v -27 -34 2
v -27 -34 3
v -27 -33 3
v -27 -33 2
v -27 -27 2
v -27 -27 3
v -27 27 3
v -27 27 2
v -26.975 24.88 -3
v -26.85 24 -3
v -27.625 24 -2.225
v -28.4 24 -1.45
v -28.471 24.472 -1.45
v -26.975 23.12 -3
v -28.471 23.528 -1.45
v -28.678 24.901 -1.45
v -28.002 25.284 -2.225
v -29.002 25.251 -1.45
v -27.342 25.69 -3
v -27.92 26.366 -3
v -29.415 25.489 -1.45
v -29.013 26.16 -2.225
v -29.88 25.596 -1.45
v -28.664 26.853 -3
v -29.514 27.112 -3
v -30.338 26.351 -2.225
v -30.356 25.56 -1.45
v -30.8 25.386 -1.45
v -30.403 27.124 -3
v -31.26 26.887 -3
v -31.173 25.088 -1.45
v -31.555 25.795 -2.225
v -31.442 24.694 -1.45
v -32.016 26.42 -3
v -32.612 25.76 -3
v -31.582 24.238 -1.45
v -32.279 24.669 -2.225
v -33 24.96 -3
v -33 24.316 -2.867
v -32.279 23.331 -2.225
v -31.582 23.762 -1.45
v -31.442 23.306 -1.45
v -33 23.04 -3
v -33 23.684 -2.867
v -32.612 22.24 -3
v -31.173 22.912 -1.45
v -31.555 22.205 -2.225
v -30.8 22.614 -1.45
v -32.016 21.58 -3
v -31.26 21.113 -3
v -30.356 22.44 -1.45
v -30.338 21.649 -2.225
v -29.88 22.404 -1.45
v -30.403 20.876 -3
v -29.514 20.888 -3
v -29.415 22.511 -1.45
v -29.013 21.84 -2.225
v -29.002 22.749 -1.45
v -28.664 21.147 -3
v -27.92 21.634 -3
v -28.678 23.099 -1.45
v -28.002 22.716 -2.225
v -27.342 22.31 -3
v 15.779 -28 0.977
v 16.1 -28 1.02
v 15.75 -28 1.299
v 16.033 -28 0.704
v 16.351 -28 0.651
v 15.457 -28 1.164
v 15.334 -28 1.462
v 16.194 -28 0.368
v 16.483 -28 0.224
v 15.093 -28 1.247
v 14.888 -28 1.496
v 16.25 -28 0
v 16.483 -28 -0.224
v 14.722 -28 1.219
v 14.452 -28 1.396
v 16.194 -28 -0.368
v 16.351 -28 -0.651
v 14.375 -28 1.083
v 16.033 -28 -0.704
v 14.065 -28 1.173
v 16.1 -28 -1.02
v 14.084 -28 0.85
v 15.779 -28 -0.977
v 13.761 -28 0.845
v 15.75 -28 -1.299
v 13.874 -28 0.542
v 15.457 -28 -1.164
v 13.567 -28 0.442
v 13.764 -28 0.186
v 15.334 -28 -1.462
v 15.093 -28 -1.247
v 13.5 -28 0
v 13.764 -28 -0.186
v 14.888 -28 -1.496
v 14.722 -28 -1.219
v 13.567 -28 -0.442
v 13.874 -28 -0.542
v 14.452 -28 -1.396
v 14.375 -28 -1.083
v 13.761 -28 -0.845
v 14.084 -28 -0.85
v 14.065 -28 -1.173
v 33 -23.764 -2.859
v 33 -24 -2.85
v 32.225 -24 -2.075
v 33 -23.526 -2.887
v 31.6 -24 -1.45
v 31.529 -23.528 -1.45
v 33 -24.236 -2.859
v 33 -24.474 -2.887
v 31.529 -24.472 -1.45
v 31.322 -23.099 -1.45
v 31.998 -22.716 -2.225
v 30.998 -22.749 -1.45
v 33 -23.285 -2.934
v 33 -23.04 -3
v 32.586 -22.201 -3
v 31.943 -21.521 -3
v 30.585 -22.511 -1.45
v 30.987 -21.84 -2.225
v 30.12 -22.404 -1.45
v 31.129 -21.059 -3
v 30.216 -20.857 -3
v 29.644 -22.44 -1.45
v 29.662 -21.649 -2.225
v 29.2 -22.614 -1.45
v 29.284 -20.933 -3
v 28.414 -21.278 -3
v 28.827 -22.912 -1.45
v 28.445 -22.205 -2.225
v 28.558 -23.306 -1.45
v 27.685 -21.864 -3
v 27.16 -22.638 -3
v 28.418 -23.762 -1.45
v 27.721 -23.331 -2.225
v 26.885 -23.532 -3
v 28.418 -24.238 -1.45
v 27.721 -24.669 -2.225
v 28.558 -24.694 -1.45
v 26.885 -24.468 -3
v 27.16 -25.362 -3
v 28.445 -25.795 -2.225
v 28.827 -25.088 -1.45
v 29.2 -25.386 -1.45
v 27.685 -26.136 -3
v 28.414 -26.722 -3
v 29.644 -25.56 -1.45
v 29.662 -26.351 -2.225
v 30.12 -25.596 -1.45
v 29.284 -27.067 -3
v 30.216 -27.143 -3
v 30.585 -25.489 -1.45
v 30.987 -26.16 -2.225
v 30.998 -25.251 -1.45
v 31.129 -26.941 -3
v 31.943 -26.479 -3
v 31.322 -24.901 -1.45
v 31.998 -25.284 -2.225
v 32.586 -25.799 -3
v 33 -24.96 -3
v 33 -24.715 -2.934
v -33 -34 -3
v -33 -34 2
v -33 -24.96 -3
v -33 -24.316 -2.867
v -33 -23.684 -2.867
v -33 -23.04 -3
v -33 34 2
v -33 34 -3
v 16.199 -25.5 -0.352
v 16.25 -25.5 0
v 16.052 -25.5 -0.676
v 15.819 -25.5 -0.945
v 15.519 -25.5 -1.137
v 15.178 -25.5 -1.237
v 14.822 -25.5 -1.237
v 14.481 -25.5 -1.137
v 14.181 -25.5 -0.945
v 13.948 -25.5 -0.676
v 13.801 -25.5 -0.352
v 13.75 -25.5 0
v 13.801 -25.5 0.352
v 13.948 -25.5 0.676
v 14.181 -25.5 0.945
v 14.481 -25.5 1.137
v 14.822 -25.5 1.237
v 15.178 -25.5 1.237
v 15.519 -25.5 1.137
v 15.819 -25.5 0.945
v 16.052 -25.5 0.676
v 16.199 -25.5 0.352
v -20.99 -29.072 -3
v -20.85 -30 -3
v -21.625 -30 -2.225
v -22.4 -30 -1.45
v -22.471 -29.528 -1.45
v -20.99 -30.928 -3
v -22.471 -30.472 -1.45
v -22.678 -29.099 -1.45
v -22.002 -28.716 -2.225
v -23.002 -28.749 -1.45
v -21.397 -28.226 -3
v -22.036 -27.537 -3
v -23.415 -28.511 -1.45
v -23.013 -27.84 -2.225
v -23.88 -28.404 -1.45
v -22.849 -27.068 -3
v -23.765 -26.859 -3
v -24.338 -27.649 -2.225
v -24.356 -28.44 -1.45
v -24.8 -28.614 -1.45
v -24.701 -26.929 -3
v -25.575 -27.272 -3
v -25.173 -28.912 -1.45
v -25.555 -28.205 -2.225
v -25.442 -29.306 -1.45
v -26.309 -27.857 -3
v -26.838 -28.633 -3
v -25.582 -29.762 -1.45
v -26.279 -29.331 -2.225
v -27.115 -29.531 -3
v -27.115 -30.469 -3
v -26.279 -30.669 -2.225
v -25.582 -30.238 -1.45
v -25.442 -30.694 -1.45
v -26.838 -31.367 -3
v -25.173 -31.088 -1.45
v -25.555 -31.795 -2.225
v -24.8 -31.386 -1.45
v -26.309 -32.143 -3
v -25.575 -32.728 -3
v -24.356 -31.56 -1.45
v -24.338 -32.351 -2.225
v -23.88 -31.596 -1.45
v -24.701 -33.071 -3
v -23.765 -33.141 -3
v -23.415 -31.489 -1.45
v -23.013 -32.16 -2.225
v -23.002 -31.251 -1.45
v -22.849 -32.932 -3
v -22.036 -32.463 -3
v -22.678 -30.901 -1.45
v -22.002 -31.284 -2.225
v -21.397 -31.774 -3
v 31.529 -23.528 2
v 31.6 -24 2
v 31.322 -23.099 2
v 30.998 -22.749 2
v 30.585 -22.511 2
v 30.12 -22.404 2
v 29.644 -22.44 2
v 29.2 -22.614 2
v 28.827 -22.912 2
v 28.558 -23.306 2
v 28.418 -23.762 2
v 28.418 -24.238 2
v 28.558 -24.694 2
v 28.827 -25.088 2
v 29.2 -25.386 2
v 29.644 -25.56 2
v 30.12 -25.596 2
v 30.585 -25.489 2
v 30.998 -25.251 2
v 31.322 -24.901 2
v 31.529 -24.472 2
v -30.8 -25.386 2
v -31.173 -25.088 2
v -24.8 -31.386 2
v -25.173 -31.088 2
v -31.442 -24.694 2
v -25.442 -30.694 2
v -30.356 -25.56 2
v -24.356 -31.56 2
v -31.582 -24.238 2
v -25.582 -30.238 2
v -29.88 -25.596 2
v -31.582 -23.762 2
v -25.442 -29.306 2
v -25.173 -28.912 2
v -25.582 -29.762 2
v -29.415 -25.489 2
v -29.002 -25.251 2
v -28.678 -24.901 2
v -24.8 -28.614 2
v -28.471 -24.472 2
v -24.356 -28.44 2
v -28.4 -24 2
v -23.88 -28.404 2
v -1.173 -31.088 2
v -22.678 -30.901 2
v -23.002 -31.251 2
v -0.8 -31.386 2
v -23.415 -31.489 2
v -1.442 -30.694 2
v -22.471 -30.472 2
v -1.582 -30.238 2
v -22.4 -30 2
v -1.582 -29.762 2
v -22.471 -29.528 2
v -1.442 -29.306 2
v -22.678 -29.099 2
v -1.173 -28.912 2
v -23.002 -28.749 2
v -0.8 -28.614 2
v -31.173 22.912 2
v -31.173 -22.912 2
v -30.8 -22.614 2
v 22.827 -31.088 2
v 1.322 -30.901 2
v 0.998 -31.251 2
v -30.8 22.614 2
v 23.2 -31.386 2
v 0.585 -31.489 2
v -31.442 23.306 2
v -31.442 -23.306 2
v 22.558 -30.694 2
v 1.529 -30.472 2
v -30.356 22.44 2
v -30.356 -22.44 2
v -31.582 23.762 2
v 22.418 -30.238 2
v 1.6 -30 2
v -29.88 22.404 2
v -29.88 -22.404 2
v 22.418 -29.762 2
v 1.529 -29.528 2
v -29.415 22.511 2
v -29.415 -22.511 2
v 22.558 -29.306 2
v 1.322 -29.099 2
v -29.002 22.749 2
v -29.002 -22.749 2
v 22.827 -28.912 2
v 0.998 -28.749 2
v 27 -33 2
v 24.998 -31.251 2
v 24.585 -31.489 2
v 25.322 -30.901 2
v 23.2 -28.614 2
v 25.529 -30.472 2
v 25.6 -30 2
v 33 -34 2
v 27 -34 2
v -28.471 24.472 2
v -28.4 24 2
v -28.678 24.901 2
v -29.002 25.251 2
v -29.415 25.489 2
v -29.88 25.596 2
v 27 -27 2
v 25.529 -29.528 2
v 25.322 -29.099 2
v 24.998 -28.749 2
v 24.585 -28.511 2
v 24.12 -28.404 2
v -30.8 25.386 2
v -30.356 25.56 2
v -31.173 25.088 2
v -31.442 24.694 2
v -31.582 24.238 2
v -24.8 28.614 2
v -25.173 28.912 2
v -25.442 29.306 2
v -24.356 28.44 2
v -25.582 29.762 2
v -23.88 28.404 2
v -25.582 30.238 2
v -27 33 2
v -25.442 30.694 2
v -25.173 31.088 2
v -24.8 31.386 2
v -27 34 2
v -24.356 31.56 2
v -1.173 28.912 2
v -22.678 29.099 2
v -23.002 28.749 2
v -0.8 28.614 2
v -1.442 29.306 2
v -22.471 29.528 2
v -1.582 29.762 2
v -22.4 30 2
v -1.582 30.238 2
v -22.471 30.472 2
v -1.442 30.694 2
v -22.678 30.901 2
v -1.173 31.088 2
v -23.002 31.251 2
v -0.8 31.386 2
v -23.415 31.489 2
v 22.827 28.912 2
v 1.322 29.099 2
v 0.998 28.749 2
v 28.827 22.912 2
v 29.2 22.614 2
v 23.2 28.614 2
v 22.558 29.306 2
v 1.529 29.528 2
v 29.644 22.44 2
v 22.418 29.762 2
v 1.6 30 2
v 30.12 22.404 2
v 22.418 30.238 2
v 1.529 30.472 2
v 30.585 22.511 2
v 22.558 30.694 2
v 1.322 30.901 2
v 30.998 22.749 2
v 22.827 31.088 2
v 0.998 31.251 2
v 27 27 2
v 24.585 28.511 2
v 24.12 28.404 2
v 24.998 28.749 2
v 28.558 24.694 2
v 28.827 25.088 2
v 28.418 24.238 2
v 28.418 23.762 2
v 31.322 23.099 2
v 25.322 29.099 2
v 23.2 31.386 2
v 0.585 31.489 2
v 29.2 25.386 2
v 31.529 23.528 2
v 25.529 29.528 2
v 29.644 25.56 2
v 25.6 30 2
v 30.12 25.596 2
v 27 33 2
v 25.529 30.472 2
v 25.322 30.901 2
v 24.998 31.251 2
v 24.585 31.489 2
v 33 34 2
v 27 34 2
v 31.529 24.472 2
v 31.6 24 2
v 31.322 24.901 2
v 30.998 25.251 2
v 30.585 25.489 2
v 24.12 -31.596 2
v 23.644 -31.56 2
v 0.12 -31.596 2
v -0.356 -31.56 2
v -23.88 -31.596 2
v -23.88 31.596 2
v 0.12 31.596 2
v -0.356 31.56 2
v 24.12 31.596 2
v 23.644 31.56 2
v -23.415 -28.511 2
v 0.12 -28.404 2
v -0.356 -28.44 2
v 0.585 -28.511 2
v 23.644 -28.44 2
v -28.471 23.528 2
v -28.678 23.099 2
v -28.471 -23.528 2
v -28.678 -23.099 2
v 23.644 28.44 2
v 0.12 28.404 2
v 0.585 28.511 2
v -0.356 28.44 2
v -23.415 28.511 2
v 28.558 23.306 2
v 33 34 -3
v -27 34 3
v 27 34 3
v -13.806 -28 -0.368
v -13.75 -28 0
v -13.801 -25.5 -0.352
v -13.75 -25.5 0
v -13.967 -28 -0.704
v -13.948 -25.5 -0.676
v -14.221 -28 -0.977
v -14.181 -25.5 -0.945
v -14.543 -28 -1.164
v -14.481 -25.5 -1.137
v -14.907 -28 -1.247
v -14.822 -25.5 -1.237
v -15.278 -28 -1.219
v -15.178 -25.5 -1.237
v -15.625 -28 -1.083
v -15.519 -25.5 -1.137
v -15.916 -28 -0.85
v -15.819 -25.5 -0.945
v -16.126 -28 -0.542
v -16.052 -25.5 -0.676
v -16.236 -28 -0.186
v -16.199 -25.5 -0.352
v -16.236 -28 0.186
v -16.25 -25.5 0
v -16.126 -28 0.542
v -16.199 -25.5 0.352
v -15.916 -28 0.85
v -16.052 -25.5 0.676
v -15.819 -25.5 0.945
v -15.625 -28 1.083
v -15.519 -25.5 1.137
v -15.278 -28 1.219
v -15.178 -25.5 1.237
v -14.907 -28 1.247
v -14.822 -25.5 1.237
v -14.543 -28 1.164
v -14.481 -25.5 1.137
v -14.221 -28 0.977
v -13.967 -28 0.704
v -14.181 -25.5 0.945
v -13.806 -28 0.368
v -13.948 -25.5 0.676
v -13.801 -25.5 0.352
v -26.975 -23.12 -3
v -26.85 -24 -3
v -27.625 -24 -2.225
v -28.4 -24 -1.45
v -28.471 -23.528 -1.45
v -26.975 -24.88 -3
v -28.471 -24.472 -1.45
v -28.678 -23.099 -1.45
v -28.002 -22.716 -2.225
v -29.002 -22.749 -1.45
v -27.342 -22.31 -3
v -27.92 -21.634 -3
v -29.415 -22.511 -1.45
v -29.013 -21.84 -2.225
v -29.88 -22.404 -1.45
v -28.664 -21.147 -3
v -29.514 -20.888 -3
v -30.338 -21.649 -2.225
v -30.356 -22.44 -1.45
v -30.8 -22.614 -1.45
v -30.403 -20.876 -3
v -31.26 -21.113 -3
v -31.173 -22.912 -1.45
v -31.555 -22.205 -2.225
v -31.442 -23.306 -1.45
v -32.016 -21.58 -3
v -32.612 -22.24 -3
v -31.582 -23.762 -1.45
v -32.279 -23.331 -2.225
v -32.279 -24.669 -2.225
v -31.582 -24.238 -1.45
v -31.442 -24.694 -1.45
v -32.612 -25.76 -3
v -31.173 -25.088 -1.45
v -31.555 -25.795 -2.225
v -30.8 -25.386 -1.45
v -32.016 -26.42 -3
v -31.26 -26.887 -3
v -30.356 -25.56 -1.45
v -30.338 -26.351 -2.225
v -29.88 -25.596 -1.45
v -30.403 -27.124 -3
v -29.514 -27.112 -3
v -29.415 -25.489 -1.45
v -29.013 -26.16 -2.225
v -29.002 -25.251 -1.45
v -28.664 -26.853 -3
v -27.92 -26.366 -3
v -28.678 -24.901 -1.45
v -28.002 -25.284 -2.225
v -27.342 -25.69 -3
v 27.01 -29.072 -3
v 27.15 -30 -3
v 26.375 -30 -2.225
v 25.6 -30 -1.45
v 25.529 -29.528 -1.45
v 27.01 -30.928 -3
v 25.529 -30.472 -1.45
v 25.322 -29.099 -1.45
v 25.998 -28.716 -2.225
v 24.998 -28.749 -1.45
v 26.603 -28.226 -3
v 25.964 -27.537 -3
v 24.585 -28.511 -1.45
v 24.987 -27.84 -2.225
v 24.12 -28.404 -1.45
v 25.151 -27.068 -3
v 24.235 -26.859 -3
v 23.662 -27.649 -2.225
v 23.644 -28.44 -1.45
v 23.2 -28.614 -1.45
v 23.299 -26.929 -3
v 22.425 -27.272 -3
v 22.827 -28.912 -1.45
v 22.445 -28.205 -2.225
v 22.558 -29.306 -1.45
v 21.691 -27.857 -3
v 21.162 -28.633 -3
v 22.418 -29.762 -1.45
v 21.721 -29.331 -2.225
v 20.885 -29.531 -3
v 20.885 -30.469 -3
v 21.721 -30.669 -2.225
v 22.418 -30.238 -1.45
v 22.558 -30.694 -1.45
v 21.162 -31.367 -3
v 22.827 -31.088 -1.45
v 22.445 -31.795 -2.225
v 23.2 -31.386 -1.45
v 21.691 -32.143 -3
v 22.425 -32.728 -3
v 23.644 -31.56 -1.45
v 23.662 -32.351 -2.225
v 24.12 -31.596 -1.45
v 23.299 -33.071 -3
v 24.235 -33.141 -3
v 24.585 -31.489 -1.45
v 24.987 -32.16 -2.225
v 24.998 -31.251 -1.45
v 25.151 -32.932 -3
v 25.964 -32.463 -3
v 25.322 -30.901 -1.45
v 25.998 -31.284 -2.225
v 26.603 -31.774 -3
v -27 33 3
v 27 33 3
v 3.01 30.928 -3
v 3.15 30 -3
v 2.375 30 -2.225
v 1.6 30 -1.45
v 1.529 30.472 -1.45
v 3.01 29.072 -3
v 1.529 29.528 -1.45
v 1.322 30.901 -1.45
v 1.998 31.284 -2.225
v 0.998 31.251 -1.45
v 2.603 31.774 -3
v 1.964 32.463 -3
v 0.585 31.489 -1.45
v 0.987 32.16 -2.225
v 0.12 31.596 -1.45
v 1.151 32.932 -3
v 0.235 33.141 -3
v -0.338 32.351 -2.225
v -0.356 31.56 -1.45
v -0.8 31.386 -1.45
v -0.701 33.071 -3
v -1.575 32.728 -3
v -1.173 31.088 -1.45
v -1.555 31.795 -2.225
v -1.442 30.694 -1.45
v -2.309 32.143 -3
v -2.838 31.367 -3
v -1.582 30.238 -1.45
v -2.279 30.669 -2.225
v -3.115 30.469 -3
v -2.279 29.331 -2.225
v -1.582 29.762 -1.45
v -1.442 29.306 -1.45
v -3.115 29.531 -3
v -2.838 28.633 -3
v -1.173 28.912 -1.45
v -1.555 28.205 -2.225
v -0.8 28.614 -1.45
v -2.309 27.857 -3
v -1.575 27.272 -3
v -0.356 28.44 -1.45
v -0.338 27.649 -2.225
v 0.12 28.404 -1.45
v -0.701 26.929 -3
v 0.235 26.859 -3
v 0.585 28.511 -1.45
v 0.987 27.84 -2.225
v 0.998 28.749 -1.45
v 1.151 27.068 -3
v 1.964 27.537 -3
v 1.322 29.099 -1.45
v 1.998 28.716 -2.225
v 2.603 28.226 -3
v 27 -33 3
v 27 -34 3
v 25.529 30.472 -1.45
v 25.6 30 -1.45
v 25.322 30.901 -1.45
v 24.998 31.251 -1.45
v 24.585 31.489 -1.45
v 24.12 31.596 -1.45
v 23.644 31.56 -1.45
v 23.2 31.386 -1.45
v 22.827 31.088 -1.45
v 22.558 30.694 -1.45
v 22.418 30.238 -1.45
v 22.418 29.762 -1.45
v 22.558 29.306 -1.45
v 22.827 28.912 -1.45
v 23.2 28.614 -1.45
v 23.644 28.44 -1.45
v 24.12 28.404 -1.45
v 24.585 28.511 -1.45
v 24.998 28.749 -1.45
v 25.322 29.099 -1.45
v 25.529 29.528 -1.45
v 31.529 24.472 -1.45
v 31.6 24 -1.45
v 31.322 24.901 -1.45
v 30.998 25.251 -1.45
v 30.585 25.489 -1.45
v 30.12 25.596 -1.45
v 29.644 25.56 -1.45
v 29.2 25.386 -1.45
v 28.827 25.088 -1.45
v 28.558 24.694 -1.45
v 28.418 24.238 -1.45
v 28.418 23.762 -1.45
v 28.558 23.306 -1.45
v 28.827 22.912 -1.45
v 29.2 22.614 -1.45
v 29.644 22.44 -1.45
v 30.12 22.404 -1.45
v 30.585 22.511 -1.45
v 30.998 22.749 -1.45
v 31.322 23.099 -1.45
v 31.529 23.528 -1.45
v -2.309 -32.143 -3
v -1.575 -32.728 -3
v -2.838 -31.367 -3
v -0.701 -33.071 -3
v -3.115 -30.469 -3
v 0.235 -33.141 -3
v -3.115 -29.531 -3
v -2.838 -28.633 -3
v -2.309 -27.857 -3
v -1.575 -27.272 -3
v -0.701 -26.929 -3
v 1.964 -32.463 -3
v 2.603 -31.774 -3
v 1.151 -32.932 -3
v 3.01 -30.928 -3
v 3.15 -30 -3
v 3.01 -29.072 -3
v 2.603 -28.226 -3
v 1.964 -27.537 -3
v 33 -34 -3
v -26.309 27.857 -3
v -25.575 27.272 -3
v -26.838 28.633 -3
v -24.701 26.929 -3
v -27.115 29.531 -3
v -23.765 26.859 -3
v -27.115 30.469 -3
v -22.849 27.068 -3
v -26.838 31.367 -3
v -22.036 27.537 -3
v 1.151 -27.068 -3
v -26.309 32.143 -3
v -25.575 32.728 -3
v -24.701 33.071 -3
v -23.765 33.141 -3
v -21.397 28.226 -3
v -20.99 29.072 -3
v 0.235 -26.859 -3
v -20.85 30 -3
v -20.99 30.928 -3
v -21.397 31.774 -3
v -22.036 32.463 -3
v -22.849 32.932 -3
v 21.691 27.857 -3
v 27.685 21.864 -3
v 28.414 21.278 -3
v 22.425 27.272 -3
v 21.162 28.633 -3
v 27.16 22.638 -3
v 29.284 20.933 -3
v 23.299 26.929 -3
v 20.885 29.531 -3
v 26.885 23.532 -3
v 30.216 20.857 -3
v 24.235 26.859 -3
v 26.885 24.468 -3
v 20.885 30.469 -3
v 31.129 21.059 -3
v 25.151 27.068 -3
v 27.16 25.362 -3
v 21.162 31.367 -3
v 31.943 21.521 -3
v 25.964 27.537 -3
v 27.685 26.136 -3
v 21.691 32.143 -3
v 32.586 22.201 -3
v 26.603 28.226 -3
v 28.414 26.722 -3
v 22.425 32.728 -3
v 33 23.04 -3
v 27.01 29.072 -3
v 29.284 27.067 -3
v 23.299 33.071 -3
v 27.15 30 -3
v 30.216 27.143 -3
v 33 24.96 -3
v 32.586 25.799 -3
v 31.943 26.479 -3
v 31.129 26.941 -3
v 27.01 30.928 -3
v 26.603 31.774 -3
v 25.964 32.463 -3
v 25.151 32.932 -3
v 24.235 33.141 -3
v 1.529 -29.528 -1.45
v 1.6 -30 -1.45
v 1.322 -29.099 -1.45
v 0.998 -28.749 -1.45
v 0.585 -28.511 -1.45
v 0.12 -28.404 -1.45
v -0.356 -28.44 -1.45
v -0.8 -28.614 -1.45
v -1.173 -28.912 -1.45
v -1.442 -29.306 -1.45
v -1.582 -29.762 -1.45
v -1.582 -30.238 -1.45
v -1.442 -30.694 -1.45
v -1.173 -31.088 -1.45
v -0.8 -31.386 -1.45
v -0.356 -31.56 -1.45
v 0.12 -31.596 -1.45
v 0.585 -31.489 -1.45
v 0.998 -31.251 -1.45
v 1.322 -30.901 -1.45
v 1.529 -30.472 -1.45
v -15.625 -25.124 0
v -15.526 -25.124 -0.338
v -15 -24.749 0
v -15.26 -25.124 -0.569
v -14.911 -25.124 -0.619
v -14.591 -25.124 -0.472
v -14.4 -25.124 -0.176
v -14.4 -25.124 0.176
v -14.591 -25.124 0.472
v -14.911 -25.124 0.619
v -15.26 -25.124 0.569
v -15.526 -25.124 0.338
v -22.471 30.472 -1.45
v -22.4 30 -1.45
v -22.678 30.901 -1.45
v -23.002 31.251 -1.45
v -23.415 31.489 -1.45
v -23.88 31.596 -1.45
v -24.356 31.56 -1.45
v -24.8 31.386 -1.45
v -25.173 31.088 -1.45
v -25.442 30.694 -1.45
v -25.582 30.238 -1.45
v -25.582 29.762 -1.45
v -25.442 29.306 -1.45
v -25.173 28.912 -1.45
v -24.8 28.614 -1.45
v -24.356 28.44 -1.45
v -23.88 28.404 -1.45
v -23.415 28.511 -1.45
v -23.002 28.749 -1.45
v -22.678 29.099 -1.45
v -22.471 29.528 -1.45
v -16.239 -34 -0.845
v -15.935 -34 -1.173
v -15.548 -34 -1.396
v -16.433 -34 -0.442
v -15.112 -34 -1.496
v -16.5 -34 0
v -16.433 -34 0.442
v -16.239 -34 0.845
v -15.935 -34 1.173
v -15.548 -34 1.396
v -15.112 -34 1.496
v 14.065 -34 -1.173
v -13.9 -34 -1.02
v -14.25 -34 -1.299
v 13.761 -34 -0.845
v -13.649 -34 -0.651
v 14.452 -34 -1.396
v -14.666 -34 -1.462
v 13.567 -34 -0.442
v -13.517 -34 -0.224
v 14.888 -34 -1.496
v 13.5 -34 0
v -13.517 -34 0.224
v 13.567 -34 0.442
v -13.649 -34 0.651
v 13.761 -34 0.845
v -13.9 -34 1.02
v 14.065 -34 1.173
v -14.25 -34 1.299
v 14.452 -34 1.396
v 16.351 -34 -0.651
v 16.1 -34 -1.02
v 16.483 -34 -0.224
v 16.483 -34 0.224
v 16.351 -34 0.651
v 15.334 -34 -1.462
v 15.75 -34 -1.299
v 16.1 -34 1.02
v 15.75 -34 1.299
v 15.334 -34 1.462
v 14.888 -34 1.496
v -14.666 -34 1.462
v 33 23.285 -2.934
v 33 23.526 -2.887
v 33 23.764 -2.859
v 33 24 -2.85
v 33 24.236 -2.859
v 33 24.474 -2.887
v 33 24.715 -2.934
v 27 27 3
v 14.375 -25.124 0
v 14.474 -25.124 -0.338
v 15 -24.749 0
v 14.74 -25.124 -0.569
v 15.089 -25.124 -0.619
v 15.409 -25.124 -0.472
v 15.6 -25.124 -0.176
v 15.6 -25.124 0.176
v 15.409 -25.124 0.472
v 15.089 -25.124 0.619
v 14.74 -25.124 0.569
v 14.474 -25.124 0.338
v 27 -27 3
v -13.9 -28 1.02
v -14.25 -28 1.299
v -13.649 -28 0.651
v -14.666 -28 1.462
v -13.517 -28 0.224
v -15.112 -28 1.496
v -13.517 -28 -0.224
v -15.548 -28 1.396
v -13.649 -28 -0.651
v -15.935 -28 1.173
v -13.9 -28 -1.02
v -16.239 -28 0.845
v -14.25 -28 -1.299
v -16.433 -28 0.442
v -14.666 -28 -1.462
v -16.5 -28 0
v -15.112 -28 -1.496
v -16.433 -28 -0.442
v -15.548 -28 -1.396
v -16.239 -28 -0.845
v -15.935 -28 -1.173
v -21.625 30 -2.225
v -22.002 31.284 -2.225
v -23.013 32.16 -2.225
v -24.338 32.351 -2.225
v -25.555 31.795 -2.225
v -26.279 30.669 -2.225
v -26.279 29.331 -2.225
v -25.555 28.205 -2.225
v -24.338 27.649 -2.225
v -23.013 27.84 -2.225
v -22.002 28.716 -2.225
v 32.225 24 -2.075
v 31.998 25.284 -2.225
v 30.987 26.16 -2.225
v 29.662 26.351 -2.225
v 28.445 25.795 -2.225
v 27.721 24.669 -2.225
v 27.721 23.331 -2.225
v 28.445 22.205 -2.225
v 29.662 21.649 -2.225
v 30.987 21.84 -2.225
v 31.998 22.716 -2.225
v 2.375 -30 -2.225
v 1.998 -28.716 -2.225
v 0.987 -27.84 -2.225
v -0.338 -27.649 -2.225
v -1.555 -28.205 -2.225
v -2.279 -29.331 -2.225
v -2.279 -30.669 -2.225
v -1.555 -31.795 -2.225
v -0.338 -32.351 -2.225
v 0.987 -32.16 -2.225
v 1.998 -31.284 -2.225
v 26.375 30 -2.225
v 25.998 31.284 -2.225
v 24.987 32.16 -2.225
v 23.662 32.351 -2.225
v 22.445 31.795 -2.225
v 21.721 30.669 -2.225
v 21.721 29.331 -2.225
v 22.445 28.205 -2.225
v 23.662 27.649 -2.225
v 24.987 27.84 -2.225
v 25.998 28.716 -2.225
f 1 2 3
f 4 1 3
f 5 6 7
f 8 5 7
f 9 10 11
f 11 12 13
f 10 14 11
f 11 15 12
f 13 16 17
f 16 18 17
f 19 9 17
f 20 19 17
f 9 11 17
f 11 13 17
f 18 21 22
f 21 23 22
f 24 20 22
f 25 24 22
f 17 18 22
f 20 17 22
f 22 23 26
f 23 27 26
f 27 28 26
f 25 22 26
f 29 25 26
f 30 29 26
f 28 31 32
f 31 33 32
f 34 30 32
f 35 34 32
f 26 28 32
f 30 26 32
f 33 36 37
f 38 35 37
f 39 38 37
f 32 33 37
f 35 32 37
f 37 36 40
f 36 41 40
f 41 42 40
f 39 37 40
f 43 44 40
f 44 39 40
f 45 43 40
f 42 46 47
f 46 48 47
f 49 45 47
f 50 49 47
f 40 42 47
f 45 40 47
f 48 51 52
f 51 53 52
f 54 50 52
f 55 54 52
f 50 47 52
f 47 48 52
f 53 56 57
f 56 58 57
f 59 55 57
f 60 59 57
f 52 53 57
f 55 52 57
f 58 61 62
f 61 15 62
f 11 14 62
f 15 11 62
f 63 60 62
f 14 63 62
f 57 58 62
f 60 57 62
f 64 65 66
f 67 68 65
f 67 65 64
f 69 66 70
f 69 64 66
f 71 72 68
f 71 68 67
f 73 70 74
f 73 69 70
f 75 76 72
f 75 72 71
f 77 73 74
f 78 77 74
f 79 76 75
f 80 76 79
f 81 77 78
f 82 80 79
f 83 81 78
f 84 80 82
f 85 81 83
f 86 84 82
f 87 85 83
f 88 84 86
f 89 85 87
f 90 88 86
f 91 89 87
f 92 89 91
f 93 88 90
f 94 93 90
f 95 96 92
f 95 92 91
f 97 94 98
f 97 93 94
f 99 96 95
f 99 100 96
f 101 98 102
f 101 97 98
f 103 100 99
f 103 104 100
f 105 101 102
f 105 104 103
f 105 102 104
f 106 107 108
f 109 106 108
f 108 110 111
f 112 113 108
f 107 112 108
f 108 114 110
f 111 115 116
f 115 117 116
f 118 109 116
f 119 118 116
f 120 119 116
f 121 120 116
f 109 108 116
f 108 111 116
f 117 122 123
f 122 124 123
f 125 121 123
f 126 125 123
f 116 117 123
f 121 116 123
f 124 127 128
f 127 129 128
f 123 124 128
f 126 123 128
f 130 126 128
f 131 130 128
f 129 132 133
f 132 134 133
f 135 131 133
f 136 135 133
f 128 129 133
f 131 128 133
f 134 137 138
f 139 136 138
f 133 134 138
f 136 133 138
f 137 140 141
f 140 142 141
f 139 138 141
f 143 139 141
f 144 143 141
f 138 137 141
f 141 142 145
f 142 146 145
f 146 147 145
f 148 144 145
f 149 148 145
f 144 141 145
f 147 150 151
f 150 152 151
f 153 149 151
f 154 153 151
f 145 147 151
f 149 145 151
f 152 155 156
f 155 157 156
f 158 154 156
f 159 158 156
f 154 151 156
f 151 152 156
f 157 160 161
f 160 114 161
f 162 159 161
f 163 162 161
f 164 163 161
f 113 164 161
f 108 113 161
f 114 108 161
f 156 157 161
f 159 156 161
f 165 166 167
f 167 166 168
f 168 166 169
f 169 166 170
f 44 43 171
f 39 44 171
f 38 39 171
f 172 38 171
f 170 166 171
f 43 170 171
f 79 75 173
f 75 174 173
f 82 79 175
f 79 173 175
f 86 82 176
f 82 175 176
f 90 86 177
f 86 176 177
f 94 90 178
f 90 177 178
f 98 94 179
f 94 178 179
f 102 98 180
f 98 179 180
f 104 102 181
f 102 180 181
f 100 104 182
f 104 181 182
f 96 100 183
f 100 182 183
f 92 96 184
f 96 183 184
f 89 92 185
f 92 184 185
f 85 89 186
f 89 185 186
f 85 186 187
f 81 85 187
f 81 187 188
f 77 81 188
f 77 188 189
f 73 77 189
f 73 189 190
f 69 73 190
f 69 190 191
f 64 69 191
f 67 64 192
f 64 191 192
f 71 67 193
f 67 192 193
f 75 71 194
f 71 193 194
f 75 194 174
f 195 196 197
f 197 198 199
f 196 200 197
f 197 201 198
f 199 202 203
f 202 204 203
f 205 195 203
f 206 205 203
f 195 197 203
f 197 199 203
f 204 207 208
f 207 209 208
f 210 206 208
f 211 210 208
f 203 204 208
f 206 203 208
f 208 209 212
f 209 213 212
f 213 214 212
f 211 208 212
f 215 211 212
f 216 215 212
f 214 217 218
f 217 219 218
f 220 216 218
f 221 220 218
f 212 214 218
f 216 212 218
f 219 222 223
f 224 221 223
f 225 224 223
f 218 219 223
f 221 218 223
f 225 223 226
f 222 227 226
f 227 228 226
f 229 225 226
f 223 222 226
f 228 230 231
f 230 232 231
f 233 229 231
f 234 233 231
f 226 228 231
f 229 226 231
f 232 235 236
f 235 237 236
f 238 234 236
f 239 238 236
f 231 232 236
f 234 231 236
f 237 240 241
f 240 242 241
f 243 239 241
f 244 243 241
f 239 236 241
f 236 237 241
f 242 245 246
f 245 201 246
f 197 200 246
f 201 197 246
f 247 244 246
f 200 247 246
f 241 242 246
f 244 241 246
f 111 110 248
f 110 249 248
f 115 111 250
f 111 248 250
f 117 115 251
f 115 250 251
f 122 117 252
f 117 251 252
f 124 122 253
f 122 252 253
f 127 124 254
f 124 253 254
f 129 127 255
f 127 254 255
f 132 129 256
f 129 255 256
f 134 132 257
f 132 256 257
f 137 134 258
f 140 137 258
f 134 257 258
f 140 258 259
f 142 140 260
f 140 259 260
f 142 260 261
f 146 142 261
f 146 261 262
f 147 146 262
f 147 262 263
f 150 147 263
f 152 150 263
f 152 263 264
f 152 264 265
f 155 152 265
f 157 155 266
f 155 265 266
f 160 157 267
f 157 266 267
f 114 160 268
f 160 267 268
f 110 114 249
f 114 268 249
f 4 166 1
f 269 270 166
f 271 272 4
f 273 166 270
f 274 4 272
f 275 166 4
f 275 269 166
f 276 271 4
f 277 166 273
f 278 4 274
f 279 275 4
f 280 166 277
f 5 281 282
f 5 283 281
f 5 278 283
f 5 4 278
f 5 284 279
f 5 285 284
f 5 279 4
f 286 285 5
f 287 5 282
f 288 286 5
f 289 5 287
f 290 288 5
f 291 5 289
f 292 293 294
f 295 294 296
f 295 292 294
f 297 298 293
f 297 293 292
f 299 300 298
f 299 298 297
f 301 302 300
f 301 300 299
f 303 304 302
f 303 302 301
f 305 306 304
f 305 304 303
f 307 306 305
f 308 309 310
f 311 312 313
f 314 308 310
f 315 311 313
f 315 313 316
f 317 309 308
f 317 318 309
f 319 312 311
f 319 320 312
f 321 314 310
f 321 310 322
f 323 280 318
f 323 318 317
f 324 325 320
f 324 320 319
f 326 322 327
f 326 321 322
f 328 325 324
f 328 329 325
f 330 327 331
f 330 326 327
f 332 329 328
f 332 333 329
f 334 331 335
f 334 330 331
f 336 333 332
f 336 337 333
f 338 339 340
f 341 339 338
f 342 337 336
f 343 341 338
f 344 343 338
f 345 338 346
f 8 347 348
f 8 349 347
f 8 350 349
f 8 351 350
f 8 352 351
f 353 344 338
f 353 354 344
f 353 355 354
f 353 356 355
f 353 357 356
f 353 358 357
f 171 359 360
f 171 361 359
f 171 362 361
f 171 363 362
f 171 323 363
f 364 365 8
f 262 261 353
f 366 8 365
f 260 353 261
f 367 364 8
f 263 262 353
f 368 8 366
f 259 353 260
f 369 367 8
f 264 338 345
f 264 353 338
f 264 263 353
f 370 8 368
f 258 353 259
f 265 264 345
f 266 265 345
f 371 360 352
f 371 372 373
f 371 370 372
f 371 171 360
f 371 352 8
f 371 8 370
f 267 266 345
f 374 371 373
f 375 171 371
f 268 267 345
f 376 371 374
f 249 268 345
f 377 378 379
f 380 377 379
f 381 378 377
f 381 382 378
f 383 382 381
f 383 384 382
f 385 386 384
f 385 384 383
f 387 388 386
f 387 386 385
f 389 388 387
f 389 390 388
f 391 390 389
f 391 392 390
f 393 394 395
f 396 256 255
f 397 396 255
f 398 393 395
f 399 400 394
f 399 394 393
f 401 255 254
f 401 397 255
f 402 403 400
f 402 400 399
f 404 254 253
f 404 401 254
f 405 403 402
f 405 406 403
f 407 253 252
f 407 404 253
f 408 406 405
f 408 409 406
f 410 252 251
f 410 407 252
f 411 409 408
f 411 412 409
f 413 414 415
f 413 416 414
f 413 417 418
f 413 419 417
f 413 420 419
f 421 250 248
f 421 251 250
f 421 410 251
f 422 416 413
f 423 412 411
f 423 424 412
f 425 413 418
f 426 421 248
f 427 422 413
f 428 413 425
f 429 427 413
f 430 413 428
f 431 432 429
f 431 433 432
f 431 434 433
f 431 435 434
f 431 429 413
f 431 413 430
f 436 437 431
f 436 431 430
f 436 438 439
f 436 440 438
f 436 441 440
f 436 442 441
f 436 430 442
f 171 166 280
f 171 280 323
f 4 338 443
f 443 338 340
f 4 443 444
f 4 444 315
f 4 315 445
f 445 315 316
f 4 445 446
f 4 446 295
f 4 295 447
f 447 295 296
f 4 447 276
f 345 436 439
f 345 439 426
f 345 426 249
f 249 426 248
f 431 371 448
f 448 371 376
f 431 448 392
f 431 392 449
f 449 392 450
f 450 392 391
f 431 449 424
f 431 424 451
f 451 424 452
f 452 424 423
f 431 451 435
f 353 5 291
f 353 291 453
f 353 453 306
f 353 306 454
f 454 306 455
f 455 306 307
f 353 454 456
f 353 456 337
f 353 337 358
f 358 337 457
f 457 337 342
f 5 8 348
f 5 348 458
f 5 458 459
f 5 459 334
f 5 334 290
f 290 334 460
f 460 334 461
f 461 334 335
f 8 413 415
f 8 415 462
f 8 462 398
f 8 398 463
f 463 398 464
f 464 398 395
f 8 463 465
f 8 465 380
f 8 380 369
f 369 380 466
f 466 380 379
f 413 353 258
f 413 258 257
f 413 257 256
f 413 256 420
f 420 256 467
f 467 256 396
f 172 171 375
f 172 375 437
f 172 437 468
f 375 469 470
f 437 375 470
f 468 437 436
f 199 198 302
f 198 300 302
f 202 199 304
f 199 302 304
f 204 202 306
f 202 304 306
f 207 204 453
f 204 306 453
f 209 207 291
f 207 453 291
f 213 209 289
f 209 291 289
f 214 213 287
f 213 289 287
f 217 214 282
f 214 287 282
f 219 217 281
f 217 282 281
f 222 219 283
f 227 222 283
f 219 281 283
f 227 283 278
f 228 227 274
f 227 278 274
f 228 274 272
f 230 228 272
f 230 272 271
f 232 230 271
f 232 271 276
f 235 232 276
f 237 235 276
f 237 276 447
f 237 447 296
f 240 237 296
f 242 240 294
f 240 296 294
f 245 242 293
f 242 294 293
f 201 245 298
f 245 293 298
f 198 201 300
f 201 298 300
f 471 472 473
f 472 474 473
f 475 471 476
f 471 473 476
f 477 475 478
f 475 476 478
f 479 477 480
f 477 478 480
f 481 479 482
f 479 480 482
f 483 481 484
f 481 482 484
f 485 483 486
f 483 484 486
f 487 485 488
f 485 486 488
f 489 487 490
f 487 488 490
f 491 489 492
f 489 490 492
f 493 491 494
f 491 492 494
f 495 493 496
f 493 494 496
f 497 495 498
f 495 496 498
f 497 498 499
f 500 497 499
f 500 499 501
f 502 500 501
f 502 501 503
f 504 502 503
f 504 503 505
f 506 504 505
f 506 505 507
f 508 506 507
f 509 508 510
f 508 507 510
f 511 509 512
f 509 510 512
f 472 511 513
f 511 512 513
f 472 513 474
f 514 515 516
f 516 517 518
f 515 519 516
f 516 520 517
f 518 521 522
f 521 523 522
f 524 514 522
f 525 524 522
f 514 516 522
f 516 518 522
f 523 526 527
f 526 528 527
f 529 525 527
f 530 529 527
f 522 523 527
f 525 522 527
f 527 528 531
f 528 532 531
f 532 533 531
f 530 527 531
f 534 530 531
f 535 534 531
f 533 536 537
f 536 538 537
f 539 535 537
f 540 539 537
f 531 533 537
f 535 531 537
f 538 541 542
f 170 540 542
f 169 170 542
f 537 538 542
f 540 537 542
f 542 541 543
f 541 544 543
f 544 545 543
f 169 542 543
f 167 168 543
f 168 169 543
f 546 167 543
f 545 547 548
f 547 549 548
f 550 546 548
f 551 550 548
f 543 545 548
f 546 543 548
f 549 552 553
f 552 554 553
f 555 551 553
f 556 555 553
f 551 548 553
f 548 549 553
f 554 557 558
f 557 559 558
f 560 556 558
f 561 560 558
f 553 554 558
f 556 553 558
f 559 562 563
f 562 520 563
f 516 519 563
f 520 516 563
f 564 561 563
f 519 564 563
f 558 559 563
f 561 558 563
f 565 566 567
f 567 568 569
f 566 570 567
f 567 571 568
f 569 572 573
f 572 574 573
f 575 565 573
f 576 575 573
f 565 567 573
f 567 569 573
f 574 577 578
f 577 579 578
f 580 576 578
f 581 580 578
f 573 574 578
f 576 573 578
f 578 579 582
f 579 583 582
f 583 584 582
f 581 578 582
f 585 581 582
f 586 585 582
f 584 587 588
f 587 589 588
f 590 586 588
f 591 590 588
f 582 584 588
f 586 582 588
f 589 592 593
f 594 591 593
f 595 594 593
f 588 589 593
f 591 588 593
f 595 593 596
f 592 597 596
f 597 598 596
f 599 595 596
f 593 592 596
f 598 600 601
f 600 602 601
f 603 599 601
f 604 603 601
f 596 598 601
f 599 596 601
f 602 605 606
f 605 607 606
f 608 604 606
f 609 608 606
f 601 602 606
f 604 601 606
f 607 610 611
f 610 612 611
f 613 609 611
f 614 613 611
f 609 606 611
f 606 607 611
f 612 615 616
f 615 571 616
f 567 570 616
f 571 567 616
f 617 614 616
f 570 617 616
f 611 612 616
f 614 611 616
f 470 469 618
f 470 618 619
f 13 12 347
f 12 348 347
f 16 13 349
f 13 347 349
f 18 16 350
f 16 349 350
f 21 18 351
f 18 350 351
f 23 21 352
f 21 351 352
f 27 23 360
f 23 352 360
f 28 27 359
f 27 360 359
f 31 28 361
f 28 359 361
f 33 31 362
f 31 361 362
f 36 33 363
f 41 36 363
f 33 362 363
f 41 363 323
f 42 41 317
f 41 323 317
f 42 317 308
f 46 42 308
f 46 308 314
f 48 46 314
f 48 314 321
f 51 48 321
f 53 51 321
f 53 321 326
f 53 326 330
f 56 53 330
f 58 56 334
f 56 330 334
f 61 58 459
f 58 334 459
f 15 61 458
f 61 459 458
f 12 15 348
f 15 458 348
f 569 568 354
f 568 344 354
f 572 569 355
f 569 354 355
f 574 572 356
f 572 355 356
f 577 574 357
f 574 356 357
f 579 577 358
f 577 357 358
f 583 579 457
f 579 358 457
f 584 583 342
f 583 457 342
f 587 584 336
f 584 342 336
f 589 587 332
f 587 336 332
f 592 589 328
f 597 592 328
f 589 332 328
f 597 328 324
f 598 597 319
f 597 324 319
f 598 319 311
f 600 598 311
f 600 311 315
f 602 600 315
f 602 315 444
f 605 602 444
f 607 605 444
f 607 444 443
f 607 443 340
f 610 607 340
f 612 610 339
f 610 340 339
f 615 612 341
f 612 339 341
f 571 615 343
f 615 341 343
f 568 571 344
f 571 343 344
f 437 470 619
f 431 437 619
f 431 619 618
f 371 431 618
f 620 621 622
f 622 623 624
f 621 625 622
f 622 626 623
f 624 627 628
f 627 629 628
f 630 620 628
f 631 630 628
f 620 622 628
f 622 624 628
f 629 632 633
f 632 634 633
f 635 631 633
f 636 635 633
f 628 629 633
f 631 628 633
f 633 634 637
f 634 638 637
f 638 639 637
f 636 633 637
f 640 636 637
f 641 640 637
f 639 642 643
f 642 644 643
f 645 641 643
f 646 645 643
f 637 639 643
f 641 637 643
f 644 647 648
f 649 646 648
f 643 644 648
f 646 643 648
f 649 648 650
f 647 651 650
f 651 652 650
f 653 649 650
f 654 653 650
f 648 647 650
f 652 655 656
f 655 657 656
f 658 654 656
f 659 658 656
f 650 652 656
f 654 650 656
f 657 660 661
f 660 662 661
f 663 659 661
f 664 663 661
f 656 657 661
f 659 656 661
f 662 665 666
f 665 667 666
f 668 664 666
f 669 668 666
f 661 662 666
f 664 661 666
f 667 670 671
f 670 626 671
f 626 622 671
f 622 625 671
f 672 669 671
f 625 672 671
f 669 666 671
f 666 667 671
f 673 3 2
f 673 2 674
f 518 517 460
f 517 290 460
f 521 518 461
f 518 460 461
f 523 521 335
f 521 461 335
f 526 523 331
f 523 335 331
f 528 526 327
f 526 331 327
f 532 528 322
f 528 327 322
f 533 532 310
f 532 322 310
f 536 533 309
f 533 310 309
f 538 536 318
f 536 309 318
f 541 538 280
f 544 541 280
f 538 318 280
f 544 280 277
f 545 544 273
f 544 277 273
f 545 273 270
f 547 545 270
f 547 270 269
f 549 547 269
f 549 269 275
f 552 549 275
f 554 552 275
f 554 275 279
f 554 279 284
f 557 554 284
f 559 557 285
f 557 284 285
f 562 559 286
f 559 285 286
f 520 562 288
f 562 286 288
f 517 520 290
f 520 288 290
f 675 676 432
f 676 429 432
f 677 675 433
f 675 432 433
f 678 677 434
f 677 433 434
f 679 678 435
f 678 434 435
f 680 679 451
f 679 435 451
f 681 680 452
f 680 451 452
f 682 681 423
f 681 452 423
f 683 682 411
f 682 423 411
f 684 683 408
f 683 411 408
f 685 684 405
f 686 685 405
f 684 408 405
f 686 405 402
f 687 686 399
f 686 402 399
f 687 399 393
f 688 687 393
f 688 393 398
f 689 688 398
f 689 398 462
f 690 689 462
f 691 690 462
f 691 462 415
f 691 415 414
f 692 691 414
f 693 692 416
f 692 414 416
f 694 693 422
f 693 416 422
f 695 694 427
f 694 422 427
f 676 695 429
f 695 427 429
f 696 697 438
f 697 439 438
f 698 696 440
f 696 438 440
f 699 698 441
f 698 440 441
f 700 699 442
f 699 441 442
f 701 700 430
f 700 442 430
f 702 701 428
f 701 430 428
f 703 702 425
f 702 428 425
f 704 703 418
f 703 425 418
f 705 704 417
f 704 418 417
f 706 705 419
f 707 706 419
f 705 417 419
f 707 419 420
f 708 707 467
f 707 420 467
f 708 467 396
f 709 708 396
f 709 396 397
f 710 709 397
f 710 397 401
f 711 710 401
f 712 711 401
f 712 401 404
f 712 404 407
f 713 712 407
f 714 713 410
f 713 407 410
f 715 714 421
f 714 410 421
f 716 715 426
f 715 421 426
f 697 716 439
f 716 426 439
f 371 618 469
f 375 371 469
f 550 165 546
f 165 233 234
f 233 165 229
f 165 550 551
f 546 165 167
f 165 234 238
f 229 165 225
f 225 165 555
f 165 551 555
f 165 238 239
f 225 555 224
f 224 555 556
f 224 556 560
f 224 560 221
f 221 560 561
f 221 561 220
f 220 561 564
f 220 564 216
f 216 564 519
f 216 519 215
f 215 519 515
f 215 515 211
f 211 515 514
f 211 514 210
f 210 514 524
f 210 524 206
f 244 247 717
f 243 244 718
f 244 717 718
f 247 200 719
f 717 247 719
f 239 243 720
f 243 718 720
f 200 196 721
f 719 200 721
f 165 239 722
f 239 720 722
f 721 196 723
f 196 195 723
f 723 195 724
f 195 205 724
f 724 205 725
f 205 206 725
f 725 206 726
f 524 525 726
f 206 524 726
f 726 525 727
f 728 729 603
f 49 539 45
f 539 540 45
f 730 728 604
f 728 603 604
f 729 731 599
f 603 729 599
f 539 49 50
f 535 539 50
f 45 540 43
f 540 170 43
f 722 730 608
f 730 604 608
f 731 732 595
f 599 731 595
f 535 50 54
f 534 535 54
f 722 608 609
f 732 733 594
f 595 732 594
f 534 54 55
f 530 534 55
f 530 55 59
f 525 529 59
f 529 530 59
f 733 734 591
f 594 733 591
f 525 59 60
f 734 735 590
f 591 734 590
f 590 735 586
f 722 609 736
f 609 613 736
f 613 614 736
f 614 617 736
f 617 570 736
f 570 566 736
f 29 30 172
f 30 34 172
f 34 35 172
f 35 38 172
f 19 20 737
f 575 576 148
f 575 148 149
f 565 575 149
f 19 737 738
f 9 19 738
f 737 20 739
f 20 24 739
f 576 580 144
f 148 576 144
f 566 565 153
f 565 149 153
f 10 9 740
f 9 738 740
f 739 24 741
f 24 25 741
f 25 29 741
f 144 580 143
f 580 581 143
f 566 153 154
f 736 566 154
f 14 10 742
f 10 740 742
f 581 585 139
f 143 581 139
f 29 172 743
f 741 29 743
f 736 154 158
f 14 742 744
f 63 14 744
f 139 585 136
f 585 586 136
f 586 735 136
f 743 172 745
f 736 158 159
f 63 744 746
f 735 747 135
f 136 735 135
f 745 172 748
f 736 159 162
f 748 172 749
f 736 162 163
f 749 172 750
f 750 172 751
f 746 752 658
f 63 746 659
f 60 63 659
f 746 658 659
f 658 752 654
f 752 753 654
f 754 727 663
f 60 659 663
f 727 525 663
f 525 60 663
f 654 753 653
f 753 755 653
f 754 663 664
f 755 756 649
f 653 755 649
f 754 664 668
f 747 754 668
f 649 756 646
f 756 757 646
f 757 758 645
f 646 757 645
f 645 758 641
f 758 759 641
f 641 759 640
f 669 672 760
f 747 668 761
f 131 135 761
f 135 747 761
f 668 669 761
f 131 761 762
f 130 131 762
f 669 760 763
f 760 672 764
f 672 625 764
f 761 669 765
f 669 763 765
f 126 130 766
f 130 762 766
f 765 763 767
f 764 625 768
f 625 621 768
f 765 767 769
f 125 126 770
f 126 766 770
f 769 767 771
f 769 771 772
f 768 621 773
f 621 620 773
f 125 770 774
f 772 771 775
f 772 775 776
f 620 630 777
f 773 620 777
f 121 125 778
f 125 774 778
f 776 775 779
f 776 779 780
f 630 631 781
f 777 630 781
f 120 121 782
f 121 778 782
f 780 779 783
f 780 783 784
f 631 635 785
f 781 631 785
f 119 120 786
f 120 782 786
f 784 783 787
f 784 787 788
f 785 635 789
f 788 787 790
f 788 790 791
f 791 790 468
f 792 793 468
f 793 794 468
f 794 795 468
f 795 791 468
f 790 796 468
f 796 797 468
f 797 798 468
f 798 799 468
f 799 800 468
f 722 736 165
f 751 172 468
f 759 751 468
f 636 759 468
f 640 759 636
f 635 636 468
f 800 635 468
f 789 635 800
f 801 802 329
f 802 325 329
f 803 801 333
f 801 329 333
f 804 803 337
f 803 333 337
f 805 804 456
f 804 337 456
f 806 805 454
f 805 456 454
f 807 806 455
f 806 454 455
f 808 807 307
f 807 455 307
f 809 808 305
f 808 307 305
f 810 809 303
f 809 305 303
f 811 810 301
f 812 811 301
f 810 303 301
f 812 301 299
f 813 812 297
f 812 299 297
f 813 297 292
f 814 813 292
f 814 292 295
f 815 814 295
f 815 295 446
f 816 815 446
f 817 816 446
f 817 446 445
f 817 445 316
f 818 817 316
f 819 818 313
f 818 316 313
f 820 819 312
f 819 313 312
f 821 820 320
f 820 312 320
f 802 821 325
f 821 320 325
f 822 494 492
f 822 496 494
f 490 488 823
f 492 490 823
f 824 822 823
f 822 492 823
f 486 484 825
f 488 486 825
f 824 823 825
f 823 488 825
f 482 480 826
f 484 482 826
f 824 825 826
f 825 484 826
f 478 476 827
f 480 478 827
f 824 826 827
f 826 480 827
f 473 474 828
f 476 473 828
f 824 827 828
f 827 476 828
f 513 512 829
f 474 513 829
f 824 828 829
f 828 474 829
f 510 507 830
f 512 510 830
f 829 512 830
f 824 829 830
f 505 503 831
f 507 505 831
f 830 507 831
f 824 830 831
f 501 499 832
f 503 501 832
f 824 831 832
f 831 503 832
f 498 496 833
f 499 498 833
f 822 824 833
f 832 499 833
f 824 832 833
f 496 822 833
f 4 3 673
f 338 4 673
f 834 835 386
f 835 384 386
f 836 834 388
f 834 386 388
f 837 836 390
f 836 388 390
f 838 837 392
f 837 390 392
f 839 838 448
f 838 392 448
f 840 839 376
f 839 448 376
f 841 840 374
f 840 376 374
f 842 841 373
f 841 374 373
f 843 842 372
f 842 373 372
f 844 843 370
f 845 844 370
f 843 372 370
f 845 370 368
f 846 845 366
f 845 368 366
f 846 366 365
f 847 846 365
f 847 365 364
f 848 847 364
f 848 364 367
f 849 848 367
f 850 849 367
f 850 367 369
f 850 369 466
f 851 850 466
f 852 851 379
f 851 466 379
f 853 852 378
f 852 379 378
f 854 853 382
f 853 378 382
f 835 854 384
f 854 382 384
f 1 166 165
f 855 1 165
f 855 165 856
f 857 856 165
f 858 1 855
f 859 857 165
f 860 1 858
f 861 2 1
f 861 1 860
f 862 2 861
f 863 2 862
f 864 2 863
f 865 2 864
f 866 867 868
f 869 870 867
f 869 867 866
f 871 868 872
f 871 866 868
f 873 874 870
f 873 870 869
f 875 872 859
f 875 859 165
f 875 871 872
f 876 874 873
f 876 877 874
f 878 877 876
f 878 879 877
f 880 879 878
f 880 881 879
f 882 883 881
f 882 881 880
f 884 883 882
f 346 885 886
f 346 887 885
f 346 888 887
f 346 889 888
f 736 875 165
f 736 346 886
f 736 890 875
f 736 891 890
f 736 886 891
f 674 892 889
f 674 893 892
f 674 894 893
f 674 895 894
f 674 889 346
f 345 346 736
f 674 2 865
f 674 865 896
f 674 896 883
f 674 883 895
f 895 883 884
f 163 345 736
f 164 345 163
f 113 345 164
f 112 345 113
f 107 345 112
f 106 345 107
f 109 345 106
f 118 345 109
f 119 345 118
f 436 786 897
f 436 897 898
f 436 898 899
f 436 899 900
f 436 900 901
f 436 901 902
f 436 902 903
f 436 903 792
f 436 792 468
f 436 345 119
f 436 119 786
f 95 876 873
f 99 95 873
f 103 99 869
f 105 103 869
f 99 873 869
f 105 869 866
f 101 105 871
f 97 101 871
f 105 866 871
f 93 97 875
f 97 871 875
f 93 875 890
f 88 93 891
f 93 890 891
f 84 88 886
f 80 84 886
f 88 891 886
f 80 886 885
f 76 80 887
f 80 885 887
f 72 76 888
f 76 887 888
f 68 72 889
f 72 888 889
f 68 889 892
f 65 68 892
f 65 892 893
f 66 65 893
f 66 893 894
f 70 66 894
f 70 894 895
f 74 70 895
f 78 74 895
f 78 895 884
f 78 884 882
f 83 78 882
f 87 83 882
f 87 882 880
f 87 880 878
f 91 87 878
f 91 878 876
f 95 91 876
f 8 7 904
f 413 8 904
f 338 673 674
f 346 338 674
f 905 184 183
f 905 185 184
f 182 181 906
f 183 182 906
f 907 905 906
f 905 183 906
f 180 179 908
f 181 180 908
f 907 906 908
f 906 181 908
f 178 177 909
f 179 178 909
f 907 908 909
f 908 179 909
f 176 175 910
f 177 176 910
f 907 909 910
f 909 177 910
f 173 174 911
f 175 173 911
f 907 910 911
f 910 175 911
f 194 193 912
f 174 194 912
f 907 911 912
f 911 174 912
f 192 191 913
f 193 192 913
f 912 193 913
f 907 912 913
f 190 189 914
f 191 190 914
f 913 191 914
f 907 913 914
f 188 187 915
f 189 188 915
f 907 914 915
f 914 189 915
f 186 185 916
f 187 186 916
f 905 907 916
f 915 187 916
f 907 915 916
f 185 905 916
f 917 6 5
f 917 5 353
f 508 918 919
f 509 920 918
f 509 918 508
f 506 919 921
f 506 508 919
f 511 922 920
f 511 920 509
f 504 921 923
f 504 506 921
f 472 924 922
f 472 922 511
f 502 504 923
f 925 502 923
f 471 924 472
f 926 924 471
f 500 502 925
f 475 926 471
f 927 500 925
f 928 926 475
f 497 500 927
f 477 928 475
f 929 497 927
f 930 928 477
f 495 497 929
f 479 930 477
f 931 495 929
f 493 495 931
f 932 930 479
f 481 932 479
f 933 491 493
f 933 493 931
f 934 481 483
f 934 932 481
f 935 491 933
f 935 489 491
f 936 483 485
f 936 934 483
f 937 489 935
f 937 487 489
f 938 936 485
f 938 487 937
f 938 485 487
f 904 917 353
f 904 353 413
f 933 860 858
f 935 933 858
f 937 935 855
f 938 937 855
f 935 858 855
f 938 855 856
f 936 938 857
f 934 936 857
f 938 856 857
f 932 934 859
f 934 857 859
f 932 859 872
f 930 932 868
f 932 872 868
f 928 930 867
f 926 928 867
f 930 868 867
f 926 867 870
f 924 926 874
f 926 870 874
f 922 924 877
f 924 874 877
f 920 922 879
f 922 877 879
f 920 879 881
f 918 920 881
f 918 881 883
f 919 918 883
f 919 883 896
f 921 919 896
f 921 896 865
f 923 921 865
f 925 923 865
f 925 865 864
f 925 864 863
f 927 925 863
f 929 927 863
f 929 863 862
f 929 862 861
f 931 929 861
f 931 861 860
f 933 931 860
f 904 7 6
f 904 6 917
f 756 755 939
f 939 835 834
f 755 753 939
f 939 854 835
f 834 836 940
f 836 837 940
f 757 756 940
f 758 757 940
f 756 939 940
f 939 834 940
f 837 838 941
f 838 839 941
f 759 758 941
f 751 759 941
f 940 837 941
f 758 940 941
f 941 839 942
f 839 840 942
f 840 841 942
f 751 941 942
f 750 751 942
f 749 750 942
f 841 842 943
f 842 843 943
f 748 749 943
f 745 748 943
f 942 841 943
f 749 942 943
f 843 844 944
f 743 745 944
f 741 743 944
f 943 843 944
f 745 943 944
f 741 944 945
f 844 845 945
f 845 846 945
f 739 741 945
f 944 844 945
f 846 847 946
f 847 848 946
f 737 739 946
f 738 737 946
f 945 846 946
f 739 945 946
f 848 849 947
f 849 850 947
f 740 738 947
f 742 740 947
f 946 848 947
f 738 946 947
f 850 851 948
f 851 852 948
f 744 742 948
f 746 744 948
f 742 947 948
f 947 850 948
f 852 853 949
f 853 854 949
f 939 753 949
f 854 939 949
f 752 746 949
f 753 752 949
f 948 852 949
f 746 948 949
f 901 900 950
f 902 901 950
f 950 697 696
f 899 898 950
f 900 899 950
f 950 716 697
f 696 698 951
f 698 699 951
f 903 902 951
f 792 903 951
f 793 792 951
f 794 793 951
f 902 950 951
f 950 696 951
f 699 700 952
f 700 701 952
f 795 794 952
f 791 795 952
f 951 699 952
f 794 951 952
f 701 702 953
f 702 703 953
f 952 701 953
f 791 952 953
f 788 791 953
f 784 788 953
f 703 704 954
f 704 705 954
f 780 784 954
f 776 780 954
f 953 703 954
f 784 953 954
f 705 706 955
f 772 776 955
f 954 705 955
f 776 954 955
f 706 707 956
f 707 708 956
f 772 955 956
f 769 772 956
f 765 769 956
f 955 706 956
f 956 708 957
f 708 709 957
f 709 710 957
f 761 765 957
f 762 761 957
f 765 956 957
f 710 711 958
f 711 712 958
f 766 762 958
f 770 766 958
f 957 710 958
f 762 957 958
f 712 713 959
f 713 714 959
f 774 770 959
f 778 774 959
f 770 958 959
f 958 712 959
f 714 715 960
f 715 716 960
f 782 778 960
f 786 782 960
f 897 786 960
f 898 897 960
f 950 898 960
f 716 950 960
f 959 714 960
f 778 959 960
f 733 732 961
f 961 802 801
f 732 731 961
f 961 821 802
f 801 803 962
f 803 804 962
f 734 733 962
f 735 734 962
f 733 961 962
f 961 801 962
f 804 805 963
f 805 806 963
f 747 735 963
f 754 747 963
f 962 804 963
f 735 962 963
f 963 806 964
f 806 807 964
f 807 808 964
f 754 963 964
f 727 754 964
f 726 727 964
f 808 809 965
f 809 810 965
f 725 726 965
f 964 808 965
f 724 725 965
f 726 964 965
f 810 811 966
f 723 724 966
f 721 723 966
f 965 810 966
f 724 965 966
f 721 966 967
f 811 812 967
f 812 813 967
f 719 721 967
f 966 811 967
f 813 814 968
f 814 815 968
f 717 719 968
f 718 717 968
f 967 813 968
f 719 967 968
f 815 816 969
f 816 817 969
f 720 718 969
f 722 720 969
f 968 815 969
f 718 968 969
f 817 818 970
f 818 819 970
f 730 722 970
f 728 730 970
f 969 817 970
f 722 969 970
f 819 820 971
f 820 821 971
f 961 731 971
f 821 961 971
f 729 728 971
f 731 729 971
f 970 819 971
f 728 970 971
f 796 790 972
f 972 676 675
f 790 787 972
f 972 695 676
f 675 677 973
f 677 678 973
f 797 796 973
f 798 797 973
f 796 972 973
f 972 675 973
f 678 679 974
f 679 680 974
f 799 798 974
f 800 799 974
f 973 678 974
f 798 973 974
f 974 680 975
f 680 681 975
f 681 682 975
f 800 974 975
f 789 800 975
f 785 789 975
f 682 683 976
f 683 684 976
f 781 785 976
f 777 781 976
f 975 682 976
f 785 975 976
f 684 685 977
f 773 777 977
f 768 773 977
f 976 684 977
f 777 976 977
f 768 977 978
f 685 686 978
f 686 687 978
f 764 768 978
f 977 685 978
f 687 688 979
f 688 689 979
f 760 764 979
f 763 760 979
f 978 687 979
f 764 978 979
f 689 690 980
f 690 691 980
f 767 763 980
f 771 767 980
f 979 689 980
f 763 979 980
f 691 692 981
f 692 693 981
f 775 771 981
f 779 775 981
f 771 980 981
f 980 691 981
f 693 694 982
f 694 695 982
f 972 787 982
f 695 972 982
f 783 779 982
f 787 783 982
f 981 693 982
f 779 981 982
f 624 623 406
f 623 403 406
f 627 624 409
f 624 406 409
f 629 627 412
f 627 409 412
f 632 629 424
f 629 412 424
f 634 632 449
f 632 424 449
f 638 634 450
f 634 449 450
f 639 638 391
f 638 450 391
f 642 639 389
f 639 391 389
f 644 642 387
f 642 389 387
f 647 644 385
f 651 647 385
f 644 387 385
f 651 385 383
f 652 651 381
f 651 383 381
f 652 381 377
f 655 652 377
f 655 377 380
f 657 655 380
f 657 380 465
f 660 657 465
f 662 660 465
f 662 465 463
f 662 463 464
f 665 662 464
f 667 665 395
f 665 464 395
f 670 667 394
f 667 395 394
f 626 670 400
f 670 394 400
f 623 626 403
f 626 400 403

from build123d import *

# Parameters (mm, degrees)
SKETCH_1_W                   = 66
SKETCH_1_H                   = 68
EXTRUDE_1_DEPTH              = 3
CUT_EXTRUDE_START            = 3
SKETCH_1_3_W                 = 54
SKETCH_1_3_H                 = 54
CUT_EXTRUDE_1_DEPTH          = 1
HOLE_WIZARD_M3_1_D           = 3.2
HOLE_WIZARD_M3_1_CSINK_D     = 6.3
HOLE_WIZARD_M3_1_CSINK_ANGLE = 90
M3X0_5_1_D                   = 2.5
M3X0_5_1_DEPTH               = 8.5
M3X0_5_1_CBORE_D             = 3
M3X0_5_1_CBORE_DEPTH         = 6
M3X0_5_1_TIP                 = 0.751075774


with BuildPart() as part:
    # ｽｹｯﾁ1 → ﾎﾞｽ - 押し出し1 (new, symmetric)
    with BuildSketch(Plane.XY):
        Rectangle(SKETCH_1_W, SKETCH_1_H)
    extrude(amount=EXTRUDE_1_DEPTH, both=True)

    # ｽｹｯﾁ1<3> → ｶｯﾄ - 押し出し1 (cut)
    with BuildSketch(Plane.XY.offset(CUT_EXTRUDE_START)):
        Polygon((-27, 34), (-33, 34), (-33, -34), (-27, -34), (-27, -33), (27, -33), (27, -34), (33, -34), (33, 34), (27, 34), (27, 33), (-27, 33), align=None)
        Rectangle(SKETCH_1_3_W, SKETCH_1_3_H, mode=Mode.SUBTRACT)
    extrude(amount=-CUT_EXTRUDE_1_DEPTH, mode=Mode.SUBTRACT)

    # M3 丸皿ねじ用皿穴1 (through all)
    with Locations(Plane(origin=(24, 30, -3), x_dir=(-1, 0, 0), z_dir=(0, 0, -1))):
        with Locations((0, 0), (24, 0), (48, 0), (48, -60), (24, -60), (0, -60), (-6, -6), (-6, -54), (54, -54), (54, -6)):
            CounterSinkHole(HOLE_WIZARD_M3_1_D / 2, HOLE_WIZARD_M3_1_CSINK_D / 2, counter_sink_angle=HOLE_WIZARD_M3_1_CSINK_ANGLE)

    # M3x0.5 ねじ穴1
    with Locations(Plane(origin=(-15, -34, 0), x_dir=(-1, 0, 0), z_dir=(0, -1, 0))):
        with Locations((0, 0), (-30, 0)):
            CounterBoreHole(M3X0_5_1_D / 2, M3X0_5_1_CBORE_D / 2, M3X0_5_1_CBORE_DEPTH, depth=M3X0_5_1_DEPTH)
            with Locations((0, 0, -(M3X0_5_1_DEPTH + M3X0_5_1_TIP / 2))):  # 118° drill point
                Cone(0, M3X0_5_1_D / 2, M3X0_5_1_TIP, mode=Mode.SUBTRACT)


solid = part.part
